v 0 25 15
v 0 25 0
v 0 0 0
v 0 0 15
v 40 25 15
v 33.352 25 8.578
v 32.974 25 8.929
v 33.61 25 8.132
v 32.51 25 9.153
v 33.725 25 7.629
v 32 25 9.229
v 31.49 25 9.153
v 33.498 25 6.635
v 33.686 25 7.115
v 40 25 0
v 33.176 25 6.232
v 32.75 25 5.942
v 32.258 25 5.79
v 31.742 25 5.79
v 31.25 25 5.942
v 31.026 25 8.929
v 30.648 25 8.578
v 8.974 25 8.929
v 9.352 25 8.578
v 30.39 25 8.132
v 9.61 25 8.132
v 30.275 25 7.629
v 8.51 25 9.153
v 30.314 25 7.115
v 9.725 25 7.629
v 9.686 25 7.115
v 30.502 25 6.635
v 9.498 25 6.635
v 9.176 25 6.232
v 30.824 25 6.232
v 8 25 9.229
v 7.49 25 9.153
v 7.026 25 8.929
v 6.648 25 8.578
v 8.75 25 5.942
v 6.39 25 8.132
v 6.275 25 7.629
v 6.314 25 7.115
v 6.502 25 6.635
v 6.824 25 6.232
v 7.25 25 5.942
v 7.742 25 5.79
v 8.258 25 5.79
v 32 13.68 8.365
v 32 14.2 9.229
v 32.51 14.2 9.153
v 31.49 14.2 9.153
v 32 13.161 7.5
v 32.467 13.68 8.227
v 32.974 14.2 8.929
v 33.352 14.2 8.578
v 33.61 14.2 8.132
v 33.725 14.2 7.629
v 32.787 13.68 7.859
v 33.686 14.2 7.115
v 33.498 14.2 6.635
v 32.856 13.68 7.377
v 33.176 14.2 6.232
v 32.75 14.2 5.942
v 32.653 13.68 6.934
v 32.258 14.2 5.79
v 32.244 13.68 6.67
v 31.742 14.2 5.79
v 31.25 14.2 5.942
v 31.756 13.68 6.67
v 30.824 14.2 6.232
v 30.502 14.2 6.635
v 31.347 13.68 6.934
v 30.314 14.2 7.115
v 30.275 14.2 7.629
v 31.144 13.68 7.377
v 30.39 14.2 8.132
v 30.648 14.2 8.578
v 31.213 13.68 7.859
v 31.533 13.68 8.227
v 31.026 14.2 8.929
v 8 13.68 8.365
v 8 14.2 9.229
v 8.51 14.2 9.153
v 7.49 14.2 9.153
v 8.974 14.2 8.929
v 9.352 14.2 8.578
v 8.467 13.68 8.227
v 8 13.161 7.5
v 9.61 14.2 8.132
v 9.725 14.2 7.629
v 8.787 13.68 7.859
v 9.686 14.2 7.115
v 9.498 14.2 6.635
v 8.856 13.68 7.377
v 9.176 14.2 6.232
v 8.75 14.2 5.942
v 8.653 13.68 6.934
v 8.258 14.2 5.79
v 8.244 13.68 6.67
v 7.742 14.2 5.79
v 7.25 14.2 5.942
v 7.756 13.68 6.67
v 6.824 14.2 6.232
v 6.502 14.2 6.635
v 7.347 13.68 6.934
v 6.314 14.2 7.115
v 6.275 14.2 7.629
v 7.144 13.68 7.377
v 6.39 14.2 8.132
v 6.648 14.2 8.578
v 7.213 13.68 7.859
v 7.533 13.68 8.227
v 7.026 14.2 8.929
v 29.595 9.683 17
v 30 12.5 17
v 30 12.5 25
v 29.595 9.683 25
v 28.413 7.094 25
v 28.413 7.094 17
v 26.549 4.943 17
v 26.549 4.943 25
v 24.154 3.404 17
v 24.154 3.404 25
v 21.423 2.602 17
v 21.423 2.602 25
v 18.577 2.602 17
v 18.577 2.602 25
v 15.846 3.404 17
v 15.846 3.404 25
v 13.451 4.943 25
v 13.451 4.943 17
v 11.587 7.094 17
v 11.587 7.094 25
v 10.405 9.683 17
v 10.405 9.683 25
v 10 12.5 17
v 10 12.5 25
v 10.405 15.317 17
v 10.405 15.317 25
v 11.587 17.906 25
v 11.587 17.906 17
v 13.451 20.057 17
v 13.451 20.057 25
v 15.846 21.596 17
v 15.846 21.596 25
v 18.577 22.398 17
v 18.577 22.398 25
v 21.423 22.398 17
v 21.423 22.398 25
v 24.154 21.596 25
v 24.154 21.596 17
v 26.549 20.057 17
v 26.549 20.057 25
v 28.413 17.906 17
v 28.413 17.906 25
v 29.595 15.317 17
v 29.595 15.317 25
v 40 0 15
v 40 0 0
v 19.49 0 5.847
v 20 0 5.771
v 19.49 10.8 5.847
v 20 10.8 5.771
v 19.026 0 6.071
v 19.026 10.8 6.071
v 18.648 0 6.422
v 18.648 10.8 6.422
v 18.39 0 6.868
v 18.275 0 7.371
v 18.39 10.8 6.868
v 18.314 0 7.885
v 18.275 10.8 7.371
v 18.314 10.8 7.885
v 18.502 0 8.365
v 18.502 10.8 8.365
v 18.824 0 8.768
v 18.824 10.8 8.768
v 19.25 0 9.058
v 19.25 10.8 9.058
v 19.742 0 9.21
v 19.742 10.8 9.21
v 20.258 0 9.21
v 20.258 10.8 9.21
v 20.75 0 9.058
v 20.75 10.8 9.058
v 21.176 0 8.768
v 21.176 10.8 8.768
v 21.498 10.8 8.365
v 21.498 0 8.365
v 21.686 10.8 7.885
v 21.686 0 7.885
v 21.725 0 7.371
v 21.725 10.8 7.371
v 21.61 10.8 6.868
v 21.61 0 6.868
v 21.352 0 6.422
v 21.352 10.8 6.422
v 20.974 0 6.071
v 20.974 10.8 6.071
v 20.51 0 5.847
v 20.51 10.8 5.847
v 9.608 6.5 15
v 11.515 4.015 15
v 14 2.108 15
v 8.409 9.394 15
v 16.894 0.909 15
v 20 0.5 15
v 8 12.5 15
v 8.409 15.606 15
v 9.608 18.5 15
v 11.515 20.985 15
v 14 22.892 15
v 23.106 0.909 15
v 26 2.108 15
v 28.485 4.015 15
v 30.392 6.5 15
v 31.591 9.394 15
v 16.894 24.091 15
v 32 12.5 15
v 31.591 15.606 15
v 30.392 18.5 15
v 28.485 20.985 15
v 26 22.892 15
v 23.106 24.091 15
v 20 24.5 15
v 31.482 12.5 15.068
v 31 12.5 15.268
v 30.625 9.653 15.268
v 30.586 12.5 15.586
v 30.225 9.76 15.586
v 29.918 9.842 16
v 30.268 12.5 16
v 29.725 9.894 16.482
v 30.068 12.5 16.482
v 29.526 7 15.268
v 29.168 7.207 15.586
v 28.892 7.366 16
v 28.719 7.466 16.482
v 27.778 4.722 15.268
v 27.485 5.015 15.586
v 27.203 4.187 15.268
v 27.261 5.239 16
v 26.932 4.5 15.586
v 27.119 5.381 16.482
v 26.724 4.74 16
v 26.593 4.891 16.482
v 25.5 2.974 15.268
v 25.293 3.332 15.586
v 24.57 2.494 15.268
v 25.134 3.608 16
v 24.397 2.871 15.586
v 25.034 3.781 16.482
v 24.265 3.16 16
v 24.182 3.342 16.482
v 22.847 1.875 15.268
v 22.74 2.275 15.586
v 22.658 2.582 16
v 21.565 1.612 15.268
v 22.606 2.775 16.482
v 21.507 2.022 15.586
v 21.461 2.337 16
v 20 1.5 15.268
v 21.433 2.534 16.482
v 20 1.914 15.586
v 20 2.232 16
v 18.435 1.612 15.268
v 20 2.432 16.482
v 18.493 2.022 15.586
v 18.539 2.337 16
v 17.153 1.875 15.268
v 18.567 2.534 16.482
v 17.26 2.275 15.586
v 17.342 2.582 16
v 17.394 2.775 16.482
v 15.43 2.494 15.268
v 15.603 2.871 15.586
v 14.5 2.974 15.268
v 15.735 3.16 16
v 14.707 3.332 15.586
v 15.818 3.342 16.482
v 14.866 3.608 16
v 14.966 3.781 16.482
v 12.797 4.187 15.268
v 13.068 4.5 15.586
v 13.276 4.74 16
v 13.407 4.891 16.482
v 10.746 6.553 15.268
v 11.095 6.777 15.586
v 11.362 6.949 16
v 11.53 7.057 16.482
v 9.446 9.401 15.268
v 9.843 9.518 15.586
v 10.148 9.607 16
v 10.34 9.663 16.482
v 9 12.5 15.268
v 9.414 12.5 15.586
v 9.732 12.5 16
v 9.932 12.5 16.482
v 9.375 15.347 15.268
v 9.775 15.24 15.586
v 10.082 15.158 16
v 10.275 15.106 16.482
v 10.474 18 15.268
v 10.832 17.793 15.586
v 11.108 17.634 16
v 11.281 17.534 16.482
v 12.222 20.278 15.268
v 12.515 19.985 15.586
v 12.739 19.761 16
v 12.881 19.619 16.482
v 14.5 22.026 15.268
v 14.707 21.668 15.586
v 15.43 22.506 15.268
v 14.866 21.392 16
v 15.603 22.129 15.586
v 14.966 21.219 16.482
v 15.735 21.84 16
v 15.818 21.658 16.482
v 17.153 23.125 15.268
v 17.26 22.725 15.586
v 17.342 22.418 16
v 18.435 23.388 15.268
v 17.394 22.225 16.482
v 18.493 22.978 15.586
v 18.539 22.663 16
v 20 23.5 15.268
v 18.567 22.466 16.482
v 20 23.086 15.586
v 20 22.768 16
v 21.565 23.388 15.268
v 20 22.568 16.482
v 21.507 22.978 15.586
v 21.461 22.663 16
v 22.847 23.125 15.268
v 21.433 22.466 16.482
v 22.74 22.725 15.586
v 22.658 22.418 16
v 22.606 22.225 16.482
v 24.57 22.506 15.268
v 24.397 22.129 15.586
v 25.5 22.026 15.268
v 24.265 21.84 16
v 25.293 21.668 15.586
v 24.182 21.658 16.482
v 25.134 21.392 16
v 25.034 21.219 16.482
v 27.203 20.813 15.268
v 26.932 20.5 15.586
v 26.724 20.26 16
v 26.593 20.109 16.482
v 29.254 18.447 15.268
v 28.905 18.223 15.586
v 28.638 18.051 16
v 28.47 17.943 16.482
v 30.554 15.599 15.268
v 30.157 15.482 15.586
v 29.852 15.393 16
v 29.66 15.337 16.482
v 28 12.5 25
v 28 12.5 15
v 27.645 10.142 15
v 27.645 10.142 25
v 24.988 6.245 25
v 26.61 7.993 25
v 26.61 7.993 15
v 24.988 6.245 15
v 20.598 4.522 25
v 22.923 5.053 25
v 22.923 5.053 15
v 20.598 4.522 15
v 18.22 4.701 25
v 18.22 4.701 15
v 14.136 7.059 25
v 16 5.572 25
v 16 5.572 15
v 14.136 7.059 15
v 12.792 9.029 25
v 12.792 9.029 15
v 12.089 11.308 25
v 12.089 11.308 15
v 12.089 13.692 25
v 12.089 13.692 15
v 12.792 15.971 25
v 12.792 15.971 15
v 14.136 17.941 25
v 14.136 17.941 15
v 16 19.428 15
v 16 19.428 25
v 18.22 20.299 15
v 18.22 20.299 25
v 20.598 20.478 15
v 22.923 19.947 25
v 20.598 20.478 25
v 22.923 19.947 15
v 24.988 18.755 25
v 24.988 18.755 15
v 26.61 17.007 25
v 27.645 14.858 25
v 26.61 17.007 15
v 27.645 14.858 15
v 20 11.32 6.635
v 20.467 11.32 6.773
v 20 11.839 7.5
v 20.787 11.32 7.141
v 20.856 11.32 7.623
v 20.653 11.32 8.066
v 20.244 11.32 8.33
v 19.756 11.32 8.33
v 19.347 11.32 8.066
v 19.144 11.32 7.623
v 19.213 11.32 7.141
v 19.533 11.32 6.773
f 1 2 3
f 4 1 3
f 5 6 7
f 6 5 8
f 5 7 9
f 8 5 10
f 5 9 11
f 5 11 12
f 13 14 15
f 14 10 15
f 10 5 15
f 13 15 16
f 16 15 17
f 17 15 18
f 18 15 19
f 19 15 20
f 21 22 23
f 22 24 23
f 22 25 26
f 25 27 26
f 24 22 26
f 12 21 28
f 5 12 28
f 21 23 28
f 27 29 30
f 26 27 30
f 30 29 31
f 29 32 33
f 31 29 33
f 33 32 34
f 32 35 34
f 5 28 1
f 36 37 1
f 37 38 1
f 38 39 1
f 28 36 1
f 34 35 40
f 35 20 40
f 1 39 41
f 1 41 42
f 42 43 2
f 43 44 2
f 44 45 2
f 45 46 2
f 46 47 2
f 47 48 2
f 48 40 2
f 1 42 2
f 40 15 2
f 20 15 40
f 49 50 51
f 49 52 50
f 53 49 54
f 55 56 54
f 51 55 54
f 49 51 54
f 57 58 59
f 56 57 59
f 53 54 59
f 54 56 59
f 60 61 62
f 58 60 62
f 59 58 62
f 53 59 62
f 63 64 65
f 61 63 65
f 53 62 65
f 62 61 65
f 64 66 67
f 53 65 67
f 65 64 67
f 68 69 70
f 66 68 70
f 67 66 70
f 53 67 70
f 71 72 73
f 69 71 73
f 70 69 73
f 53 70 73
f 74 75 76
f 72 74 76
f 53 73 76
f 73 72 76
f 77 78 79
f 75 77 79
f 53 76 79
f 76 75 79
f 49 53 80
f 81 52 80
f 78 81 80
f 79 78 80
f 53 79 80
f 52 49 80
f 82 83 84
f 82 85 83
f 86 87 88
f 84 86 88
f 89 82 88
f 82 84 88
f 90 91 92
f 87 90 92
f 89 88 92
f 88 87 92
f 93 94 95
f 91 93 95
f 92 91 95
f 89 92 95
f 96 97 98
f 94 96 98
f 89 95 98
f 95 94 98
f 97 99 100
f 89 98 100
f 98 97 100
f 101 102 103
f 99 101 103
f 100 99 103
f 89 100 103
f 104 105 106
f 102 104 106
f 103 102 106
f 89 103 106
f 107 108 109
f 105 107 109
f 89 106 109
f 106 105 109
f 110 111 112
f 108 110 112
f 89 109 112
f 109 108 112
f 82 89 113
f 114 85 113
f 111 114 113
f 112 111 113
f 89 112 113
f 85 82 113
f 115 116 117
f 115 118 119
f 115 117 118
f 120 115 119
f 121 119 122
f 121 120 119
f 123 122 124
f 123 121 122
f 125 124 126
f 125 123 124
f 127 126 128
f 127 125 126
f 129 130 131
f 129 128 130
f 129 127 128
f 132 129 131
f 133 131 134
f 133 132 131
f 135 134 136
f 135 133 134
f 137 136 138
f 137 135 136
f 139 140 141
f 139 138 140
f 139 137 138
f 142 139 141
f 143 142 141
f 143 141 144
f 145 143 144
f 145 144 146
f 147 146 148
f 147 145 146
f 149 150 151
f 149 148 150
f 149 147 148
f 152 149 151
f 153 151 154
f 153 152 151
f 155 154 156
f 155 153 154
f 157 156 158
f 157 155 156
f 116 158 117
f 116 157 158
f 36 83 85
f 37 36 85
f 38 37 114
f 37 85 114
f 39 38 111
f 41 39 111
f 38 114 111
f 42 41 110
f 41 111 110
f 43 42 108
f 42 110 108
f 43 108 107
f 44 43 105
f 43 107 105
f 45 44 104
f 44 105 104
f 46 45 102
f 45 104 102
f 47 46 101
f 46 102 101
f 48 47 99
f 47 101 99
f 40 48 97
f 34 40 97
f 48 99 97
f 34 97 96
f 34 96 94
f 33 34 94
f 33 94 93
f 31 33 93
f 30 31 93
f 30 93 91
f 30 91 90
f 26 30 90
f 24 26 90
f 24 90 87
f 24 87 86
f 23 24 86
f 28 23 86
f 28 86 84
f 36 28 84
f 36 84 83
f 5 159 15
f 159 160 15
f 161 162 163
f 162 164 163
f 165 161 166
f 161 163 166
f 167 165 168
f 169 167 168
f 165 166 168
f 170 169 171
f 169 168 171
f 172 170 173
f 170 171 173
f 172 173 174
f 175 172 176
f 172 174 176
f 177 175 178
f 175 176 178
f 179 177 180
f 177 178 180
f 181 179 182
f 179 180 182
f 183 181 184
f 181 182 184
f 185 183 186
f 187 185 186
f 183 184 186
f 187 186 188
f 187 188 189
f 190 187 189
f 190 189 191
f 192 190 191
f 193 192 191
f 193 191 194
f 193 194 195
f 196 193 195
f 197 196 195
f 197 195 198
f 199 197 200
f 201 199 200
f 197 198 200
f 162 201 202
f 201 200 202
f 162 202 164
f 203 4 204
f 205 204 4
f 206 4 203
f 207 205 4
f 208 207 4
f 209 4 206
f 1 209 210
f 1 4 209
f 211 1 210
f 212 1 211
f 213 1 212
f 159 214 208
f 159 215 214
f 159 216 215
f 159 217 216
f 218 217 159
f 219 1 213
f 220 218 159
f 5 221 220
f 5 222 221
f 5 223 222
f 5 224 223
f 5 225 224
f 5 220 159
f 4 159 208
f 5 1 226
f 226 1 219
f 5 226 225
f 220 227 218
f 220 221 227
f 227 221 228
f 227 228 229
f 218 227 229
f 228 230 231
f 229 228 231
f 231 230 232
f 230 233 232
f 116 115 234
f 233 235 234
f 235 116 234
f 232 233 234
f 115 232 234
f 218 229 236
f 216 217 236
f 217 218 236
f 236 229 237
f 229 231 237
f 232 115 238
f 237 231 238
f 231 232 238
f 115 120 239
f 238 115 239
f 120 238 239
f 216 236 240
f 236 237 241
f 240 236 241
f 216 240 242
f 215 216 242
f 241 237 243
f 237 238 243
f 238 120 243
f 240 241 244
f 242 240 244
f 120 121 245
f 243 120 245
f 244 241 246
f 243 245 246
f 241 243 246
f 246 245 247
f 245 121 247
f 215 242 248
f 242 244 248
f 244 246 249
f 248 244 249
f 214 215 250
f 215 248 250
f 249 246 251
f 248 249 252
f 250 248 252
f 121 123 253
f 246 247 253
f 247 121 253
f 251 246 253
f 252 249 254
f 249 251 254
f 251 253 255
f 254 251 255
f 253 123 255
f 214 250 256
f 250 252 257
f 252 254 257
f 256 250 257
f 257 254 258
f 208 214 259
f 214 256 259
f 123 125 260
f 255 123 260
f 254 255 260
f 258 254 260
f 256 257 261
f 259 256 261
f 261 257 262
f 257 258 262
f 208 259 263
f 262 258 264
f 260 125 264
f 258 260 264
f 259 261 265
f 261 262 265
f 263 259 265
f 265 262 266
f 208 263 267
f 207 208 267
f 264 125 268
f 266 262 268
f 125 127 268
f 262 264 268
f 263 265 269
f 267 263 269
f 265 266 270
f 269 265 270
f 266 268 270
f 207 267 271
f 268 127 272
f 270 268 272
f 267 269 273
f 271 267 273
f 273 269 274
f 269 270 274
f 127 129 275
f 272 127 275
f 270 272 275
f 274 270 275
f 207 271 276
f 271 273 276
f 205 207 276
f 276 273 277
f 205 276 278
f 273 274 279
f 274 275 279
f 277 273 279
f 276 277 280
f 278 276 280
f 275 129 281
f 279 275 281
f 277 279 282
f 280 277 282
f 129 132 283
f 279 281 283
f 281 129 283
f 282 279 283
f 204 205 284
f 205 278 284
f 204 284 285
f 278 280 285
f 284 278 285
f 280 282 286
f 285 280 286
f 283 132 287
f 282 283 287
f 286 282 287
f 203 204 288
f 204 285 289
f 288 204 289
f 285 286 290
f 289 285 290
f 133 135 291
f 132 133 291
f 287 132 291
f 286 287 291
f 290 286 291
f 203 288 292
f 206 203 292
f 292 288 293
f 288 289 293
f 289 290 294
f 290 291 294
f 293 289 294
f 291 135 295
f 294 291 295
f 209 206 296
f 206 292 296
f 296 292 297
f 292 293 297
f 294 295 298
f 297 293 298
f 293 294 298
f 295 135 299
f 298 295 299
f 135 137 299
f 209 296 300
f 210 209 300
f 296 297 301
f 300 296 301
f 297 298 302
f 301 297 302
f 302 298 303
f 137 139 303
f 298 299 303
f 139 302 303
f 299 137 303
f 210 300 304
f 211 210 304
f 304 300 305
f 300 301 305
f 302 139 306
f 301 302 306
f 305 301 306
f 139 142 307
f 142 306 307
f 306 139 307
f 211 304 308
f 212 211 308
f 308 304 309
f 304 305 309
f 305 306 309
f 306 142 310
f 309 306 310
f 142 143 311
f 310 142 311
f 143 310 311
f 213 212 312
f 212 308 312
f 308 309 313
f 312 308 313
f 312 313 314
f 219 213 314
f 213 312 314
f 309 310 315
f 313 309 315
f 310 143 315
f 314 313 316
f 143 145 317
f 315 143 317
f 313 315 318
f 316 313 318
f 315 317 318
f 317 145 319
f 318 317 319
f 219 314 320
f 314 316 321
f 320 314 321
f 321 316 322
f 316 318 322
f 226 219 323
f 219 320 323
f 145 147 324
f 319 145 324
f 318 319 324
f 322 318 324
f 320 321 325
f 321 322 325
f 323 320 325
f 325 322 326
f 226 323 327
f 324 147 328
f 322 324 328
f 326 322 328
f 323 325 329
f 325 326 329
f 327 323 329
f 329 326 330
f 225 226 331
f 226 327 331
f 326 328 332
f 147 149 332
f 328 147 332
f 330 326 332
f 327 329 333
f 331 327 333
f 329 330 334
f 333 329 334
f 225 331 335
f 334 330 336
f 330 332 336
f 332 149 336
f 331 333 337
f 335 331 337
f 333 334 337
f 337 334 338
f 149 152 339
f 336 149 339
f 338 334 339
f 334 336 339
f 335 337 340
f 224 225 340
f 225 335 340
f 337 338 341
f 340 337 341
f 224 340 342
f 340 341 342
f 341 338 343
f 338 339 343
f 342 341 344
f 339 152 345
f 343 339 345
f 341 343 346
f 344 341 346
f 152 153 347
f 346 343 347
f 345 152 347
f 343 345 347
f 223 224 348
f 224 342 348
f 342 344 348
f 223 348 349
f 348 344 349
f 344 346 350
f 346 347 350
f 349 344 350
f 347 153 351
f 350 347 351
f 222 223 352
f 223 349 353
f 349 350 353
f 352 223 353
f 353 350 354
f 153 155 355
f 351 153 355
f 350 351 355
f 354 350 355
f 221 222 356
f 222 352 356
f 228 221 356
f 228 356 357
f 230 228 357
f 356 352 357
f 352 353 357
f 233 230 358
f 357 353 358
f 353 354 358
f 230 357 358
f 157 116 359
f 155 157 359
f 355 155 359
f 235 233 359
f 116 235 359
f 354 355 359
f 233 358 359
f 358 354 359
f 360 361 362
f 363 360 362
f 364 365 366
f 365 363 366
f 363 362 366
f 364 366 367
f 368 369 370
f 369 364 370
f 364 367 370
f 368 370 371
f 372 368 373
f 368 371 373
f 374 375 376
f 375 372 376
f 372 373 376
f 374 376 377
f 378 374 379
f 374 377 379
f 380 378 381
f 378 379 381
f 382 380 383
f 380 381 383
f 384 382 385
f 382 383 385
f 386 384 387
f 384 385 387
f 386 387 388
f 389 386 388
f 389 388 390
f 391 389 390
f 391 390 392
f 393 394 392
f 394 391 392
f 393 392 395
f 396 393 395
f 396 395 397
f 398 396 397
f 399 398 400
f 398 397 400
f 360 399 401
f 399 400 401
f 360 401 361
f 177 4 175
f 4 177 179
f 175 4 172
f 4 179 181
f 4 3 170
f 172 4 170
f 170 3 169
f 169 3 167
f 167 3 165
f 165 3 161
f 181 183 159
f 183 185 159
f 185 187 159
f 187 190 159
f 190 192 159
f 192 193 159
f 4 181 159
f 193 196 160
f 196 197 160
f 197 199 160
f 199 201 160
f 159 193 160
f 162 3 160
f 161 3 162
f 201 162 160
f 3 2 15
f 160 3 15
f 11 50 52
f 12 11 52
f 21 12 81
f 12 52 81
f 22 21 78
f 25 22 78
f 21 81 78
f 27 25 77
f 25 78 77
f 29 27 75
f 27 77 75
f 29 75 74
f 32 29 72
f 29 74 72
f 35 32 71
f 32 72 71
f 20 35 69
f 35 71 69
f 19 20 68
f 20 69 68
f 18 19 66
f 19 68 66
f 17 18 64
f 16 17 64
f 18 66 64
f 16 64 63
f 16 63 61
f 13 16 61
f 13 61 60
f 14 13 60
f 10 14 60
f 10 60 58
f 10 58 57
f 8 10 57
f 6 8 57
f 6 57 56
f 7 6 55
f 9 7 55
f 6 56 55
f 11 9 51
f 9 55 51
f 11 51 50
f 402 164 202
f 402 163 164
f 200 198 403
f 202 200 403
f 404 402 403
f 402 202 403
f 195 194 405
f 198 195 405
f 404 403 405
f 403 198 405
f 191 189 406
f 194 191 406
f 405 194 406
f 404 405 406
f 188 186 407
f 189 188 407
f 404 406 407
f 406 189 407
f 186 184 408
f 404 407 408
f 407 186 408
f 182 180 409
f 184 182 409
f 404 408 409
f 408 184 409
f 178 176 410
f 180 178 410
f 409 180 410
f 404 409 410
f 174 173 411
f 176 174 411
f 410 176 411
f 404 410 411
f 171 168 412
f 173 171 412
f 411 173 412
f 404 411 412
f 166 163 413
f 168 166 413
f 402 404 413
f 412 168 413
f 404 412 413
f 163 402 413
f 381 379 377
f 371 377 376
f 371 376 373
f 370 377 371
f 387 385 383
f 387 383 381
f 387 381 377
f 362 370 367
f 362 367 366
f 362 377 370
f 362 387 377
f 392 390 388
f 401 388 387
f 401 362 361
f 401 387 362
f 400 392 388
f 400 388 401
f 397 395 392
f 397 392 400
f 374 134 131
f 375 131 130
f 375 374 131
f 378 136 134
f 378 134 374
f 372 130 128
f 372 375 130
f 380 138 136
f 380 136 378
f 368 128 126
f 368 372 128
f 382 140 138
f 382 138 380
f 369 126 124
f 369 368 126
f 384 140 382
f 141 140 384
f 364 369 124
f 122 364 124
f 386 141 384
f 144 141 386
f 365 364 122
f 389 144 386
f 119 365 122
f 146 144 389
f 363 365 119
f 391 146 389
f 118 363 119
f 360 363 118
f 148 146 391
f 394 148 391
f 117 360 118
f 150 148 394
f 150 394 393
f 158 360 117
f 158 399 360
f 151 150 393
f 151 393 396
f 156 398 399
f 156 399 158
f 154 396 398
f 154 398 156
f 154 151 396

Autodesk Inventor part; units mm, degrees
ref_plane "YZ Plane" through (0, 0, 0) normal (1, 0, 0) x (0, 1, 0)
ref_plane "XZ Plane" through (0, 0, 0) normal (0, 1, 0) x (-1, 0, 0)
ref_plane "XY Plane" through (0, 0, 0) normal (0, 0, 1) x (1, 0, 0)
sketch "Sketch1" plane through (0, 0, 0) normal (0, 0, 1) x (1, 0, 0)
  line L0 (0, 0) -> (40, 0)
  line L1 (40, 0) -> (40, 25)
  line L2 (40, 25) -> (0, 25)
  line L3 (0, 25) -> (0, 0)
  dimension "d0" = 40
  dimension "d1" = 25
extrude "Extrusion1" add sketch "Sketch1" along normal blind 15
sketch "Sketch2" plane through (0, 25, 0) normal (0, 1, 0) x (1, 0, 0)
  line L0 (0, 0) -> (0, -15) projected
  line L1 (0, -7.5) -> (8, -7.5)
  line L2 (40, 0) -> (40, -15) projected
  line L3 (40, -7.5) -> (32, -7.5)
  dimension "d4" = 8
  dimension "d5" = 8
hole "Hole1" at (8, 25, 7.5) at (32, 25, 7.5) direction (0, -1, 0) diameter 3.4587 depth 10.8 tip angle 118 thread size "M4x0.5" class "6H" standard "ANSI Metric M Profile"
sketch "Sketch3" plane through (0, 0, 15) normal (0, 0, 1) x (1, 0, 0)
  line L0 (40, 25) -> (0, 25) projected
  line L1 (20, 25) -> (20, 0) construction
  line L2 (0, 0) -> (40, 0) projected
  circle A0 centre (20, 12.5) radius 10
  circle A1 centre (20, 12.5) radius 8
  dimension "d13" = 20
extrude "Extrusion2" add sketch "Sketch3" along normal blind 10
sketch "Sketch4" plane through (0, 0, 0) normal (0, -1, 0) x (1, 0, 0)
  line L0 (0, 15) -> (40, 15) projected
  line L1 (20, 15) -> (20, 0)
  line L2 (40, 0) -> (0, 0) projected
  point P0 (20, 7.5)
hole "Hole2" at (20, 0, 7.5) direction (0, 1, 0) diameter 3.4587 depth 10.8 tip angle 118 thread size "M4x0.5" class "6H" standard "ANSI Metric M Profile"
fillet "Fillet1" radius 2 1 edges at (10, 12.5, 15)
sketch "Sketch5" plane through (20, 12.5, 15) normal (0, 0, 1) x (1, 0, 0)
  point P0 (-20, -12.5)
properties part number "charging_port"
